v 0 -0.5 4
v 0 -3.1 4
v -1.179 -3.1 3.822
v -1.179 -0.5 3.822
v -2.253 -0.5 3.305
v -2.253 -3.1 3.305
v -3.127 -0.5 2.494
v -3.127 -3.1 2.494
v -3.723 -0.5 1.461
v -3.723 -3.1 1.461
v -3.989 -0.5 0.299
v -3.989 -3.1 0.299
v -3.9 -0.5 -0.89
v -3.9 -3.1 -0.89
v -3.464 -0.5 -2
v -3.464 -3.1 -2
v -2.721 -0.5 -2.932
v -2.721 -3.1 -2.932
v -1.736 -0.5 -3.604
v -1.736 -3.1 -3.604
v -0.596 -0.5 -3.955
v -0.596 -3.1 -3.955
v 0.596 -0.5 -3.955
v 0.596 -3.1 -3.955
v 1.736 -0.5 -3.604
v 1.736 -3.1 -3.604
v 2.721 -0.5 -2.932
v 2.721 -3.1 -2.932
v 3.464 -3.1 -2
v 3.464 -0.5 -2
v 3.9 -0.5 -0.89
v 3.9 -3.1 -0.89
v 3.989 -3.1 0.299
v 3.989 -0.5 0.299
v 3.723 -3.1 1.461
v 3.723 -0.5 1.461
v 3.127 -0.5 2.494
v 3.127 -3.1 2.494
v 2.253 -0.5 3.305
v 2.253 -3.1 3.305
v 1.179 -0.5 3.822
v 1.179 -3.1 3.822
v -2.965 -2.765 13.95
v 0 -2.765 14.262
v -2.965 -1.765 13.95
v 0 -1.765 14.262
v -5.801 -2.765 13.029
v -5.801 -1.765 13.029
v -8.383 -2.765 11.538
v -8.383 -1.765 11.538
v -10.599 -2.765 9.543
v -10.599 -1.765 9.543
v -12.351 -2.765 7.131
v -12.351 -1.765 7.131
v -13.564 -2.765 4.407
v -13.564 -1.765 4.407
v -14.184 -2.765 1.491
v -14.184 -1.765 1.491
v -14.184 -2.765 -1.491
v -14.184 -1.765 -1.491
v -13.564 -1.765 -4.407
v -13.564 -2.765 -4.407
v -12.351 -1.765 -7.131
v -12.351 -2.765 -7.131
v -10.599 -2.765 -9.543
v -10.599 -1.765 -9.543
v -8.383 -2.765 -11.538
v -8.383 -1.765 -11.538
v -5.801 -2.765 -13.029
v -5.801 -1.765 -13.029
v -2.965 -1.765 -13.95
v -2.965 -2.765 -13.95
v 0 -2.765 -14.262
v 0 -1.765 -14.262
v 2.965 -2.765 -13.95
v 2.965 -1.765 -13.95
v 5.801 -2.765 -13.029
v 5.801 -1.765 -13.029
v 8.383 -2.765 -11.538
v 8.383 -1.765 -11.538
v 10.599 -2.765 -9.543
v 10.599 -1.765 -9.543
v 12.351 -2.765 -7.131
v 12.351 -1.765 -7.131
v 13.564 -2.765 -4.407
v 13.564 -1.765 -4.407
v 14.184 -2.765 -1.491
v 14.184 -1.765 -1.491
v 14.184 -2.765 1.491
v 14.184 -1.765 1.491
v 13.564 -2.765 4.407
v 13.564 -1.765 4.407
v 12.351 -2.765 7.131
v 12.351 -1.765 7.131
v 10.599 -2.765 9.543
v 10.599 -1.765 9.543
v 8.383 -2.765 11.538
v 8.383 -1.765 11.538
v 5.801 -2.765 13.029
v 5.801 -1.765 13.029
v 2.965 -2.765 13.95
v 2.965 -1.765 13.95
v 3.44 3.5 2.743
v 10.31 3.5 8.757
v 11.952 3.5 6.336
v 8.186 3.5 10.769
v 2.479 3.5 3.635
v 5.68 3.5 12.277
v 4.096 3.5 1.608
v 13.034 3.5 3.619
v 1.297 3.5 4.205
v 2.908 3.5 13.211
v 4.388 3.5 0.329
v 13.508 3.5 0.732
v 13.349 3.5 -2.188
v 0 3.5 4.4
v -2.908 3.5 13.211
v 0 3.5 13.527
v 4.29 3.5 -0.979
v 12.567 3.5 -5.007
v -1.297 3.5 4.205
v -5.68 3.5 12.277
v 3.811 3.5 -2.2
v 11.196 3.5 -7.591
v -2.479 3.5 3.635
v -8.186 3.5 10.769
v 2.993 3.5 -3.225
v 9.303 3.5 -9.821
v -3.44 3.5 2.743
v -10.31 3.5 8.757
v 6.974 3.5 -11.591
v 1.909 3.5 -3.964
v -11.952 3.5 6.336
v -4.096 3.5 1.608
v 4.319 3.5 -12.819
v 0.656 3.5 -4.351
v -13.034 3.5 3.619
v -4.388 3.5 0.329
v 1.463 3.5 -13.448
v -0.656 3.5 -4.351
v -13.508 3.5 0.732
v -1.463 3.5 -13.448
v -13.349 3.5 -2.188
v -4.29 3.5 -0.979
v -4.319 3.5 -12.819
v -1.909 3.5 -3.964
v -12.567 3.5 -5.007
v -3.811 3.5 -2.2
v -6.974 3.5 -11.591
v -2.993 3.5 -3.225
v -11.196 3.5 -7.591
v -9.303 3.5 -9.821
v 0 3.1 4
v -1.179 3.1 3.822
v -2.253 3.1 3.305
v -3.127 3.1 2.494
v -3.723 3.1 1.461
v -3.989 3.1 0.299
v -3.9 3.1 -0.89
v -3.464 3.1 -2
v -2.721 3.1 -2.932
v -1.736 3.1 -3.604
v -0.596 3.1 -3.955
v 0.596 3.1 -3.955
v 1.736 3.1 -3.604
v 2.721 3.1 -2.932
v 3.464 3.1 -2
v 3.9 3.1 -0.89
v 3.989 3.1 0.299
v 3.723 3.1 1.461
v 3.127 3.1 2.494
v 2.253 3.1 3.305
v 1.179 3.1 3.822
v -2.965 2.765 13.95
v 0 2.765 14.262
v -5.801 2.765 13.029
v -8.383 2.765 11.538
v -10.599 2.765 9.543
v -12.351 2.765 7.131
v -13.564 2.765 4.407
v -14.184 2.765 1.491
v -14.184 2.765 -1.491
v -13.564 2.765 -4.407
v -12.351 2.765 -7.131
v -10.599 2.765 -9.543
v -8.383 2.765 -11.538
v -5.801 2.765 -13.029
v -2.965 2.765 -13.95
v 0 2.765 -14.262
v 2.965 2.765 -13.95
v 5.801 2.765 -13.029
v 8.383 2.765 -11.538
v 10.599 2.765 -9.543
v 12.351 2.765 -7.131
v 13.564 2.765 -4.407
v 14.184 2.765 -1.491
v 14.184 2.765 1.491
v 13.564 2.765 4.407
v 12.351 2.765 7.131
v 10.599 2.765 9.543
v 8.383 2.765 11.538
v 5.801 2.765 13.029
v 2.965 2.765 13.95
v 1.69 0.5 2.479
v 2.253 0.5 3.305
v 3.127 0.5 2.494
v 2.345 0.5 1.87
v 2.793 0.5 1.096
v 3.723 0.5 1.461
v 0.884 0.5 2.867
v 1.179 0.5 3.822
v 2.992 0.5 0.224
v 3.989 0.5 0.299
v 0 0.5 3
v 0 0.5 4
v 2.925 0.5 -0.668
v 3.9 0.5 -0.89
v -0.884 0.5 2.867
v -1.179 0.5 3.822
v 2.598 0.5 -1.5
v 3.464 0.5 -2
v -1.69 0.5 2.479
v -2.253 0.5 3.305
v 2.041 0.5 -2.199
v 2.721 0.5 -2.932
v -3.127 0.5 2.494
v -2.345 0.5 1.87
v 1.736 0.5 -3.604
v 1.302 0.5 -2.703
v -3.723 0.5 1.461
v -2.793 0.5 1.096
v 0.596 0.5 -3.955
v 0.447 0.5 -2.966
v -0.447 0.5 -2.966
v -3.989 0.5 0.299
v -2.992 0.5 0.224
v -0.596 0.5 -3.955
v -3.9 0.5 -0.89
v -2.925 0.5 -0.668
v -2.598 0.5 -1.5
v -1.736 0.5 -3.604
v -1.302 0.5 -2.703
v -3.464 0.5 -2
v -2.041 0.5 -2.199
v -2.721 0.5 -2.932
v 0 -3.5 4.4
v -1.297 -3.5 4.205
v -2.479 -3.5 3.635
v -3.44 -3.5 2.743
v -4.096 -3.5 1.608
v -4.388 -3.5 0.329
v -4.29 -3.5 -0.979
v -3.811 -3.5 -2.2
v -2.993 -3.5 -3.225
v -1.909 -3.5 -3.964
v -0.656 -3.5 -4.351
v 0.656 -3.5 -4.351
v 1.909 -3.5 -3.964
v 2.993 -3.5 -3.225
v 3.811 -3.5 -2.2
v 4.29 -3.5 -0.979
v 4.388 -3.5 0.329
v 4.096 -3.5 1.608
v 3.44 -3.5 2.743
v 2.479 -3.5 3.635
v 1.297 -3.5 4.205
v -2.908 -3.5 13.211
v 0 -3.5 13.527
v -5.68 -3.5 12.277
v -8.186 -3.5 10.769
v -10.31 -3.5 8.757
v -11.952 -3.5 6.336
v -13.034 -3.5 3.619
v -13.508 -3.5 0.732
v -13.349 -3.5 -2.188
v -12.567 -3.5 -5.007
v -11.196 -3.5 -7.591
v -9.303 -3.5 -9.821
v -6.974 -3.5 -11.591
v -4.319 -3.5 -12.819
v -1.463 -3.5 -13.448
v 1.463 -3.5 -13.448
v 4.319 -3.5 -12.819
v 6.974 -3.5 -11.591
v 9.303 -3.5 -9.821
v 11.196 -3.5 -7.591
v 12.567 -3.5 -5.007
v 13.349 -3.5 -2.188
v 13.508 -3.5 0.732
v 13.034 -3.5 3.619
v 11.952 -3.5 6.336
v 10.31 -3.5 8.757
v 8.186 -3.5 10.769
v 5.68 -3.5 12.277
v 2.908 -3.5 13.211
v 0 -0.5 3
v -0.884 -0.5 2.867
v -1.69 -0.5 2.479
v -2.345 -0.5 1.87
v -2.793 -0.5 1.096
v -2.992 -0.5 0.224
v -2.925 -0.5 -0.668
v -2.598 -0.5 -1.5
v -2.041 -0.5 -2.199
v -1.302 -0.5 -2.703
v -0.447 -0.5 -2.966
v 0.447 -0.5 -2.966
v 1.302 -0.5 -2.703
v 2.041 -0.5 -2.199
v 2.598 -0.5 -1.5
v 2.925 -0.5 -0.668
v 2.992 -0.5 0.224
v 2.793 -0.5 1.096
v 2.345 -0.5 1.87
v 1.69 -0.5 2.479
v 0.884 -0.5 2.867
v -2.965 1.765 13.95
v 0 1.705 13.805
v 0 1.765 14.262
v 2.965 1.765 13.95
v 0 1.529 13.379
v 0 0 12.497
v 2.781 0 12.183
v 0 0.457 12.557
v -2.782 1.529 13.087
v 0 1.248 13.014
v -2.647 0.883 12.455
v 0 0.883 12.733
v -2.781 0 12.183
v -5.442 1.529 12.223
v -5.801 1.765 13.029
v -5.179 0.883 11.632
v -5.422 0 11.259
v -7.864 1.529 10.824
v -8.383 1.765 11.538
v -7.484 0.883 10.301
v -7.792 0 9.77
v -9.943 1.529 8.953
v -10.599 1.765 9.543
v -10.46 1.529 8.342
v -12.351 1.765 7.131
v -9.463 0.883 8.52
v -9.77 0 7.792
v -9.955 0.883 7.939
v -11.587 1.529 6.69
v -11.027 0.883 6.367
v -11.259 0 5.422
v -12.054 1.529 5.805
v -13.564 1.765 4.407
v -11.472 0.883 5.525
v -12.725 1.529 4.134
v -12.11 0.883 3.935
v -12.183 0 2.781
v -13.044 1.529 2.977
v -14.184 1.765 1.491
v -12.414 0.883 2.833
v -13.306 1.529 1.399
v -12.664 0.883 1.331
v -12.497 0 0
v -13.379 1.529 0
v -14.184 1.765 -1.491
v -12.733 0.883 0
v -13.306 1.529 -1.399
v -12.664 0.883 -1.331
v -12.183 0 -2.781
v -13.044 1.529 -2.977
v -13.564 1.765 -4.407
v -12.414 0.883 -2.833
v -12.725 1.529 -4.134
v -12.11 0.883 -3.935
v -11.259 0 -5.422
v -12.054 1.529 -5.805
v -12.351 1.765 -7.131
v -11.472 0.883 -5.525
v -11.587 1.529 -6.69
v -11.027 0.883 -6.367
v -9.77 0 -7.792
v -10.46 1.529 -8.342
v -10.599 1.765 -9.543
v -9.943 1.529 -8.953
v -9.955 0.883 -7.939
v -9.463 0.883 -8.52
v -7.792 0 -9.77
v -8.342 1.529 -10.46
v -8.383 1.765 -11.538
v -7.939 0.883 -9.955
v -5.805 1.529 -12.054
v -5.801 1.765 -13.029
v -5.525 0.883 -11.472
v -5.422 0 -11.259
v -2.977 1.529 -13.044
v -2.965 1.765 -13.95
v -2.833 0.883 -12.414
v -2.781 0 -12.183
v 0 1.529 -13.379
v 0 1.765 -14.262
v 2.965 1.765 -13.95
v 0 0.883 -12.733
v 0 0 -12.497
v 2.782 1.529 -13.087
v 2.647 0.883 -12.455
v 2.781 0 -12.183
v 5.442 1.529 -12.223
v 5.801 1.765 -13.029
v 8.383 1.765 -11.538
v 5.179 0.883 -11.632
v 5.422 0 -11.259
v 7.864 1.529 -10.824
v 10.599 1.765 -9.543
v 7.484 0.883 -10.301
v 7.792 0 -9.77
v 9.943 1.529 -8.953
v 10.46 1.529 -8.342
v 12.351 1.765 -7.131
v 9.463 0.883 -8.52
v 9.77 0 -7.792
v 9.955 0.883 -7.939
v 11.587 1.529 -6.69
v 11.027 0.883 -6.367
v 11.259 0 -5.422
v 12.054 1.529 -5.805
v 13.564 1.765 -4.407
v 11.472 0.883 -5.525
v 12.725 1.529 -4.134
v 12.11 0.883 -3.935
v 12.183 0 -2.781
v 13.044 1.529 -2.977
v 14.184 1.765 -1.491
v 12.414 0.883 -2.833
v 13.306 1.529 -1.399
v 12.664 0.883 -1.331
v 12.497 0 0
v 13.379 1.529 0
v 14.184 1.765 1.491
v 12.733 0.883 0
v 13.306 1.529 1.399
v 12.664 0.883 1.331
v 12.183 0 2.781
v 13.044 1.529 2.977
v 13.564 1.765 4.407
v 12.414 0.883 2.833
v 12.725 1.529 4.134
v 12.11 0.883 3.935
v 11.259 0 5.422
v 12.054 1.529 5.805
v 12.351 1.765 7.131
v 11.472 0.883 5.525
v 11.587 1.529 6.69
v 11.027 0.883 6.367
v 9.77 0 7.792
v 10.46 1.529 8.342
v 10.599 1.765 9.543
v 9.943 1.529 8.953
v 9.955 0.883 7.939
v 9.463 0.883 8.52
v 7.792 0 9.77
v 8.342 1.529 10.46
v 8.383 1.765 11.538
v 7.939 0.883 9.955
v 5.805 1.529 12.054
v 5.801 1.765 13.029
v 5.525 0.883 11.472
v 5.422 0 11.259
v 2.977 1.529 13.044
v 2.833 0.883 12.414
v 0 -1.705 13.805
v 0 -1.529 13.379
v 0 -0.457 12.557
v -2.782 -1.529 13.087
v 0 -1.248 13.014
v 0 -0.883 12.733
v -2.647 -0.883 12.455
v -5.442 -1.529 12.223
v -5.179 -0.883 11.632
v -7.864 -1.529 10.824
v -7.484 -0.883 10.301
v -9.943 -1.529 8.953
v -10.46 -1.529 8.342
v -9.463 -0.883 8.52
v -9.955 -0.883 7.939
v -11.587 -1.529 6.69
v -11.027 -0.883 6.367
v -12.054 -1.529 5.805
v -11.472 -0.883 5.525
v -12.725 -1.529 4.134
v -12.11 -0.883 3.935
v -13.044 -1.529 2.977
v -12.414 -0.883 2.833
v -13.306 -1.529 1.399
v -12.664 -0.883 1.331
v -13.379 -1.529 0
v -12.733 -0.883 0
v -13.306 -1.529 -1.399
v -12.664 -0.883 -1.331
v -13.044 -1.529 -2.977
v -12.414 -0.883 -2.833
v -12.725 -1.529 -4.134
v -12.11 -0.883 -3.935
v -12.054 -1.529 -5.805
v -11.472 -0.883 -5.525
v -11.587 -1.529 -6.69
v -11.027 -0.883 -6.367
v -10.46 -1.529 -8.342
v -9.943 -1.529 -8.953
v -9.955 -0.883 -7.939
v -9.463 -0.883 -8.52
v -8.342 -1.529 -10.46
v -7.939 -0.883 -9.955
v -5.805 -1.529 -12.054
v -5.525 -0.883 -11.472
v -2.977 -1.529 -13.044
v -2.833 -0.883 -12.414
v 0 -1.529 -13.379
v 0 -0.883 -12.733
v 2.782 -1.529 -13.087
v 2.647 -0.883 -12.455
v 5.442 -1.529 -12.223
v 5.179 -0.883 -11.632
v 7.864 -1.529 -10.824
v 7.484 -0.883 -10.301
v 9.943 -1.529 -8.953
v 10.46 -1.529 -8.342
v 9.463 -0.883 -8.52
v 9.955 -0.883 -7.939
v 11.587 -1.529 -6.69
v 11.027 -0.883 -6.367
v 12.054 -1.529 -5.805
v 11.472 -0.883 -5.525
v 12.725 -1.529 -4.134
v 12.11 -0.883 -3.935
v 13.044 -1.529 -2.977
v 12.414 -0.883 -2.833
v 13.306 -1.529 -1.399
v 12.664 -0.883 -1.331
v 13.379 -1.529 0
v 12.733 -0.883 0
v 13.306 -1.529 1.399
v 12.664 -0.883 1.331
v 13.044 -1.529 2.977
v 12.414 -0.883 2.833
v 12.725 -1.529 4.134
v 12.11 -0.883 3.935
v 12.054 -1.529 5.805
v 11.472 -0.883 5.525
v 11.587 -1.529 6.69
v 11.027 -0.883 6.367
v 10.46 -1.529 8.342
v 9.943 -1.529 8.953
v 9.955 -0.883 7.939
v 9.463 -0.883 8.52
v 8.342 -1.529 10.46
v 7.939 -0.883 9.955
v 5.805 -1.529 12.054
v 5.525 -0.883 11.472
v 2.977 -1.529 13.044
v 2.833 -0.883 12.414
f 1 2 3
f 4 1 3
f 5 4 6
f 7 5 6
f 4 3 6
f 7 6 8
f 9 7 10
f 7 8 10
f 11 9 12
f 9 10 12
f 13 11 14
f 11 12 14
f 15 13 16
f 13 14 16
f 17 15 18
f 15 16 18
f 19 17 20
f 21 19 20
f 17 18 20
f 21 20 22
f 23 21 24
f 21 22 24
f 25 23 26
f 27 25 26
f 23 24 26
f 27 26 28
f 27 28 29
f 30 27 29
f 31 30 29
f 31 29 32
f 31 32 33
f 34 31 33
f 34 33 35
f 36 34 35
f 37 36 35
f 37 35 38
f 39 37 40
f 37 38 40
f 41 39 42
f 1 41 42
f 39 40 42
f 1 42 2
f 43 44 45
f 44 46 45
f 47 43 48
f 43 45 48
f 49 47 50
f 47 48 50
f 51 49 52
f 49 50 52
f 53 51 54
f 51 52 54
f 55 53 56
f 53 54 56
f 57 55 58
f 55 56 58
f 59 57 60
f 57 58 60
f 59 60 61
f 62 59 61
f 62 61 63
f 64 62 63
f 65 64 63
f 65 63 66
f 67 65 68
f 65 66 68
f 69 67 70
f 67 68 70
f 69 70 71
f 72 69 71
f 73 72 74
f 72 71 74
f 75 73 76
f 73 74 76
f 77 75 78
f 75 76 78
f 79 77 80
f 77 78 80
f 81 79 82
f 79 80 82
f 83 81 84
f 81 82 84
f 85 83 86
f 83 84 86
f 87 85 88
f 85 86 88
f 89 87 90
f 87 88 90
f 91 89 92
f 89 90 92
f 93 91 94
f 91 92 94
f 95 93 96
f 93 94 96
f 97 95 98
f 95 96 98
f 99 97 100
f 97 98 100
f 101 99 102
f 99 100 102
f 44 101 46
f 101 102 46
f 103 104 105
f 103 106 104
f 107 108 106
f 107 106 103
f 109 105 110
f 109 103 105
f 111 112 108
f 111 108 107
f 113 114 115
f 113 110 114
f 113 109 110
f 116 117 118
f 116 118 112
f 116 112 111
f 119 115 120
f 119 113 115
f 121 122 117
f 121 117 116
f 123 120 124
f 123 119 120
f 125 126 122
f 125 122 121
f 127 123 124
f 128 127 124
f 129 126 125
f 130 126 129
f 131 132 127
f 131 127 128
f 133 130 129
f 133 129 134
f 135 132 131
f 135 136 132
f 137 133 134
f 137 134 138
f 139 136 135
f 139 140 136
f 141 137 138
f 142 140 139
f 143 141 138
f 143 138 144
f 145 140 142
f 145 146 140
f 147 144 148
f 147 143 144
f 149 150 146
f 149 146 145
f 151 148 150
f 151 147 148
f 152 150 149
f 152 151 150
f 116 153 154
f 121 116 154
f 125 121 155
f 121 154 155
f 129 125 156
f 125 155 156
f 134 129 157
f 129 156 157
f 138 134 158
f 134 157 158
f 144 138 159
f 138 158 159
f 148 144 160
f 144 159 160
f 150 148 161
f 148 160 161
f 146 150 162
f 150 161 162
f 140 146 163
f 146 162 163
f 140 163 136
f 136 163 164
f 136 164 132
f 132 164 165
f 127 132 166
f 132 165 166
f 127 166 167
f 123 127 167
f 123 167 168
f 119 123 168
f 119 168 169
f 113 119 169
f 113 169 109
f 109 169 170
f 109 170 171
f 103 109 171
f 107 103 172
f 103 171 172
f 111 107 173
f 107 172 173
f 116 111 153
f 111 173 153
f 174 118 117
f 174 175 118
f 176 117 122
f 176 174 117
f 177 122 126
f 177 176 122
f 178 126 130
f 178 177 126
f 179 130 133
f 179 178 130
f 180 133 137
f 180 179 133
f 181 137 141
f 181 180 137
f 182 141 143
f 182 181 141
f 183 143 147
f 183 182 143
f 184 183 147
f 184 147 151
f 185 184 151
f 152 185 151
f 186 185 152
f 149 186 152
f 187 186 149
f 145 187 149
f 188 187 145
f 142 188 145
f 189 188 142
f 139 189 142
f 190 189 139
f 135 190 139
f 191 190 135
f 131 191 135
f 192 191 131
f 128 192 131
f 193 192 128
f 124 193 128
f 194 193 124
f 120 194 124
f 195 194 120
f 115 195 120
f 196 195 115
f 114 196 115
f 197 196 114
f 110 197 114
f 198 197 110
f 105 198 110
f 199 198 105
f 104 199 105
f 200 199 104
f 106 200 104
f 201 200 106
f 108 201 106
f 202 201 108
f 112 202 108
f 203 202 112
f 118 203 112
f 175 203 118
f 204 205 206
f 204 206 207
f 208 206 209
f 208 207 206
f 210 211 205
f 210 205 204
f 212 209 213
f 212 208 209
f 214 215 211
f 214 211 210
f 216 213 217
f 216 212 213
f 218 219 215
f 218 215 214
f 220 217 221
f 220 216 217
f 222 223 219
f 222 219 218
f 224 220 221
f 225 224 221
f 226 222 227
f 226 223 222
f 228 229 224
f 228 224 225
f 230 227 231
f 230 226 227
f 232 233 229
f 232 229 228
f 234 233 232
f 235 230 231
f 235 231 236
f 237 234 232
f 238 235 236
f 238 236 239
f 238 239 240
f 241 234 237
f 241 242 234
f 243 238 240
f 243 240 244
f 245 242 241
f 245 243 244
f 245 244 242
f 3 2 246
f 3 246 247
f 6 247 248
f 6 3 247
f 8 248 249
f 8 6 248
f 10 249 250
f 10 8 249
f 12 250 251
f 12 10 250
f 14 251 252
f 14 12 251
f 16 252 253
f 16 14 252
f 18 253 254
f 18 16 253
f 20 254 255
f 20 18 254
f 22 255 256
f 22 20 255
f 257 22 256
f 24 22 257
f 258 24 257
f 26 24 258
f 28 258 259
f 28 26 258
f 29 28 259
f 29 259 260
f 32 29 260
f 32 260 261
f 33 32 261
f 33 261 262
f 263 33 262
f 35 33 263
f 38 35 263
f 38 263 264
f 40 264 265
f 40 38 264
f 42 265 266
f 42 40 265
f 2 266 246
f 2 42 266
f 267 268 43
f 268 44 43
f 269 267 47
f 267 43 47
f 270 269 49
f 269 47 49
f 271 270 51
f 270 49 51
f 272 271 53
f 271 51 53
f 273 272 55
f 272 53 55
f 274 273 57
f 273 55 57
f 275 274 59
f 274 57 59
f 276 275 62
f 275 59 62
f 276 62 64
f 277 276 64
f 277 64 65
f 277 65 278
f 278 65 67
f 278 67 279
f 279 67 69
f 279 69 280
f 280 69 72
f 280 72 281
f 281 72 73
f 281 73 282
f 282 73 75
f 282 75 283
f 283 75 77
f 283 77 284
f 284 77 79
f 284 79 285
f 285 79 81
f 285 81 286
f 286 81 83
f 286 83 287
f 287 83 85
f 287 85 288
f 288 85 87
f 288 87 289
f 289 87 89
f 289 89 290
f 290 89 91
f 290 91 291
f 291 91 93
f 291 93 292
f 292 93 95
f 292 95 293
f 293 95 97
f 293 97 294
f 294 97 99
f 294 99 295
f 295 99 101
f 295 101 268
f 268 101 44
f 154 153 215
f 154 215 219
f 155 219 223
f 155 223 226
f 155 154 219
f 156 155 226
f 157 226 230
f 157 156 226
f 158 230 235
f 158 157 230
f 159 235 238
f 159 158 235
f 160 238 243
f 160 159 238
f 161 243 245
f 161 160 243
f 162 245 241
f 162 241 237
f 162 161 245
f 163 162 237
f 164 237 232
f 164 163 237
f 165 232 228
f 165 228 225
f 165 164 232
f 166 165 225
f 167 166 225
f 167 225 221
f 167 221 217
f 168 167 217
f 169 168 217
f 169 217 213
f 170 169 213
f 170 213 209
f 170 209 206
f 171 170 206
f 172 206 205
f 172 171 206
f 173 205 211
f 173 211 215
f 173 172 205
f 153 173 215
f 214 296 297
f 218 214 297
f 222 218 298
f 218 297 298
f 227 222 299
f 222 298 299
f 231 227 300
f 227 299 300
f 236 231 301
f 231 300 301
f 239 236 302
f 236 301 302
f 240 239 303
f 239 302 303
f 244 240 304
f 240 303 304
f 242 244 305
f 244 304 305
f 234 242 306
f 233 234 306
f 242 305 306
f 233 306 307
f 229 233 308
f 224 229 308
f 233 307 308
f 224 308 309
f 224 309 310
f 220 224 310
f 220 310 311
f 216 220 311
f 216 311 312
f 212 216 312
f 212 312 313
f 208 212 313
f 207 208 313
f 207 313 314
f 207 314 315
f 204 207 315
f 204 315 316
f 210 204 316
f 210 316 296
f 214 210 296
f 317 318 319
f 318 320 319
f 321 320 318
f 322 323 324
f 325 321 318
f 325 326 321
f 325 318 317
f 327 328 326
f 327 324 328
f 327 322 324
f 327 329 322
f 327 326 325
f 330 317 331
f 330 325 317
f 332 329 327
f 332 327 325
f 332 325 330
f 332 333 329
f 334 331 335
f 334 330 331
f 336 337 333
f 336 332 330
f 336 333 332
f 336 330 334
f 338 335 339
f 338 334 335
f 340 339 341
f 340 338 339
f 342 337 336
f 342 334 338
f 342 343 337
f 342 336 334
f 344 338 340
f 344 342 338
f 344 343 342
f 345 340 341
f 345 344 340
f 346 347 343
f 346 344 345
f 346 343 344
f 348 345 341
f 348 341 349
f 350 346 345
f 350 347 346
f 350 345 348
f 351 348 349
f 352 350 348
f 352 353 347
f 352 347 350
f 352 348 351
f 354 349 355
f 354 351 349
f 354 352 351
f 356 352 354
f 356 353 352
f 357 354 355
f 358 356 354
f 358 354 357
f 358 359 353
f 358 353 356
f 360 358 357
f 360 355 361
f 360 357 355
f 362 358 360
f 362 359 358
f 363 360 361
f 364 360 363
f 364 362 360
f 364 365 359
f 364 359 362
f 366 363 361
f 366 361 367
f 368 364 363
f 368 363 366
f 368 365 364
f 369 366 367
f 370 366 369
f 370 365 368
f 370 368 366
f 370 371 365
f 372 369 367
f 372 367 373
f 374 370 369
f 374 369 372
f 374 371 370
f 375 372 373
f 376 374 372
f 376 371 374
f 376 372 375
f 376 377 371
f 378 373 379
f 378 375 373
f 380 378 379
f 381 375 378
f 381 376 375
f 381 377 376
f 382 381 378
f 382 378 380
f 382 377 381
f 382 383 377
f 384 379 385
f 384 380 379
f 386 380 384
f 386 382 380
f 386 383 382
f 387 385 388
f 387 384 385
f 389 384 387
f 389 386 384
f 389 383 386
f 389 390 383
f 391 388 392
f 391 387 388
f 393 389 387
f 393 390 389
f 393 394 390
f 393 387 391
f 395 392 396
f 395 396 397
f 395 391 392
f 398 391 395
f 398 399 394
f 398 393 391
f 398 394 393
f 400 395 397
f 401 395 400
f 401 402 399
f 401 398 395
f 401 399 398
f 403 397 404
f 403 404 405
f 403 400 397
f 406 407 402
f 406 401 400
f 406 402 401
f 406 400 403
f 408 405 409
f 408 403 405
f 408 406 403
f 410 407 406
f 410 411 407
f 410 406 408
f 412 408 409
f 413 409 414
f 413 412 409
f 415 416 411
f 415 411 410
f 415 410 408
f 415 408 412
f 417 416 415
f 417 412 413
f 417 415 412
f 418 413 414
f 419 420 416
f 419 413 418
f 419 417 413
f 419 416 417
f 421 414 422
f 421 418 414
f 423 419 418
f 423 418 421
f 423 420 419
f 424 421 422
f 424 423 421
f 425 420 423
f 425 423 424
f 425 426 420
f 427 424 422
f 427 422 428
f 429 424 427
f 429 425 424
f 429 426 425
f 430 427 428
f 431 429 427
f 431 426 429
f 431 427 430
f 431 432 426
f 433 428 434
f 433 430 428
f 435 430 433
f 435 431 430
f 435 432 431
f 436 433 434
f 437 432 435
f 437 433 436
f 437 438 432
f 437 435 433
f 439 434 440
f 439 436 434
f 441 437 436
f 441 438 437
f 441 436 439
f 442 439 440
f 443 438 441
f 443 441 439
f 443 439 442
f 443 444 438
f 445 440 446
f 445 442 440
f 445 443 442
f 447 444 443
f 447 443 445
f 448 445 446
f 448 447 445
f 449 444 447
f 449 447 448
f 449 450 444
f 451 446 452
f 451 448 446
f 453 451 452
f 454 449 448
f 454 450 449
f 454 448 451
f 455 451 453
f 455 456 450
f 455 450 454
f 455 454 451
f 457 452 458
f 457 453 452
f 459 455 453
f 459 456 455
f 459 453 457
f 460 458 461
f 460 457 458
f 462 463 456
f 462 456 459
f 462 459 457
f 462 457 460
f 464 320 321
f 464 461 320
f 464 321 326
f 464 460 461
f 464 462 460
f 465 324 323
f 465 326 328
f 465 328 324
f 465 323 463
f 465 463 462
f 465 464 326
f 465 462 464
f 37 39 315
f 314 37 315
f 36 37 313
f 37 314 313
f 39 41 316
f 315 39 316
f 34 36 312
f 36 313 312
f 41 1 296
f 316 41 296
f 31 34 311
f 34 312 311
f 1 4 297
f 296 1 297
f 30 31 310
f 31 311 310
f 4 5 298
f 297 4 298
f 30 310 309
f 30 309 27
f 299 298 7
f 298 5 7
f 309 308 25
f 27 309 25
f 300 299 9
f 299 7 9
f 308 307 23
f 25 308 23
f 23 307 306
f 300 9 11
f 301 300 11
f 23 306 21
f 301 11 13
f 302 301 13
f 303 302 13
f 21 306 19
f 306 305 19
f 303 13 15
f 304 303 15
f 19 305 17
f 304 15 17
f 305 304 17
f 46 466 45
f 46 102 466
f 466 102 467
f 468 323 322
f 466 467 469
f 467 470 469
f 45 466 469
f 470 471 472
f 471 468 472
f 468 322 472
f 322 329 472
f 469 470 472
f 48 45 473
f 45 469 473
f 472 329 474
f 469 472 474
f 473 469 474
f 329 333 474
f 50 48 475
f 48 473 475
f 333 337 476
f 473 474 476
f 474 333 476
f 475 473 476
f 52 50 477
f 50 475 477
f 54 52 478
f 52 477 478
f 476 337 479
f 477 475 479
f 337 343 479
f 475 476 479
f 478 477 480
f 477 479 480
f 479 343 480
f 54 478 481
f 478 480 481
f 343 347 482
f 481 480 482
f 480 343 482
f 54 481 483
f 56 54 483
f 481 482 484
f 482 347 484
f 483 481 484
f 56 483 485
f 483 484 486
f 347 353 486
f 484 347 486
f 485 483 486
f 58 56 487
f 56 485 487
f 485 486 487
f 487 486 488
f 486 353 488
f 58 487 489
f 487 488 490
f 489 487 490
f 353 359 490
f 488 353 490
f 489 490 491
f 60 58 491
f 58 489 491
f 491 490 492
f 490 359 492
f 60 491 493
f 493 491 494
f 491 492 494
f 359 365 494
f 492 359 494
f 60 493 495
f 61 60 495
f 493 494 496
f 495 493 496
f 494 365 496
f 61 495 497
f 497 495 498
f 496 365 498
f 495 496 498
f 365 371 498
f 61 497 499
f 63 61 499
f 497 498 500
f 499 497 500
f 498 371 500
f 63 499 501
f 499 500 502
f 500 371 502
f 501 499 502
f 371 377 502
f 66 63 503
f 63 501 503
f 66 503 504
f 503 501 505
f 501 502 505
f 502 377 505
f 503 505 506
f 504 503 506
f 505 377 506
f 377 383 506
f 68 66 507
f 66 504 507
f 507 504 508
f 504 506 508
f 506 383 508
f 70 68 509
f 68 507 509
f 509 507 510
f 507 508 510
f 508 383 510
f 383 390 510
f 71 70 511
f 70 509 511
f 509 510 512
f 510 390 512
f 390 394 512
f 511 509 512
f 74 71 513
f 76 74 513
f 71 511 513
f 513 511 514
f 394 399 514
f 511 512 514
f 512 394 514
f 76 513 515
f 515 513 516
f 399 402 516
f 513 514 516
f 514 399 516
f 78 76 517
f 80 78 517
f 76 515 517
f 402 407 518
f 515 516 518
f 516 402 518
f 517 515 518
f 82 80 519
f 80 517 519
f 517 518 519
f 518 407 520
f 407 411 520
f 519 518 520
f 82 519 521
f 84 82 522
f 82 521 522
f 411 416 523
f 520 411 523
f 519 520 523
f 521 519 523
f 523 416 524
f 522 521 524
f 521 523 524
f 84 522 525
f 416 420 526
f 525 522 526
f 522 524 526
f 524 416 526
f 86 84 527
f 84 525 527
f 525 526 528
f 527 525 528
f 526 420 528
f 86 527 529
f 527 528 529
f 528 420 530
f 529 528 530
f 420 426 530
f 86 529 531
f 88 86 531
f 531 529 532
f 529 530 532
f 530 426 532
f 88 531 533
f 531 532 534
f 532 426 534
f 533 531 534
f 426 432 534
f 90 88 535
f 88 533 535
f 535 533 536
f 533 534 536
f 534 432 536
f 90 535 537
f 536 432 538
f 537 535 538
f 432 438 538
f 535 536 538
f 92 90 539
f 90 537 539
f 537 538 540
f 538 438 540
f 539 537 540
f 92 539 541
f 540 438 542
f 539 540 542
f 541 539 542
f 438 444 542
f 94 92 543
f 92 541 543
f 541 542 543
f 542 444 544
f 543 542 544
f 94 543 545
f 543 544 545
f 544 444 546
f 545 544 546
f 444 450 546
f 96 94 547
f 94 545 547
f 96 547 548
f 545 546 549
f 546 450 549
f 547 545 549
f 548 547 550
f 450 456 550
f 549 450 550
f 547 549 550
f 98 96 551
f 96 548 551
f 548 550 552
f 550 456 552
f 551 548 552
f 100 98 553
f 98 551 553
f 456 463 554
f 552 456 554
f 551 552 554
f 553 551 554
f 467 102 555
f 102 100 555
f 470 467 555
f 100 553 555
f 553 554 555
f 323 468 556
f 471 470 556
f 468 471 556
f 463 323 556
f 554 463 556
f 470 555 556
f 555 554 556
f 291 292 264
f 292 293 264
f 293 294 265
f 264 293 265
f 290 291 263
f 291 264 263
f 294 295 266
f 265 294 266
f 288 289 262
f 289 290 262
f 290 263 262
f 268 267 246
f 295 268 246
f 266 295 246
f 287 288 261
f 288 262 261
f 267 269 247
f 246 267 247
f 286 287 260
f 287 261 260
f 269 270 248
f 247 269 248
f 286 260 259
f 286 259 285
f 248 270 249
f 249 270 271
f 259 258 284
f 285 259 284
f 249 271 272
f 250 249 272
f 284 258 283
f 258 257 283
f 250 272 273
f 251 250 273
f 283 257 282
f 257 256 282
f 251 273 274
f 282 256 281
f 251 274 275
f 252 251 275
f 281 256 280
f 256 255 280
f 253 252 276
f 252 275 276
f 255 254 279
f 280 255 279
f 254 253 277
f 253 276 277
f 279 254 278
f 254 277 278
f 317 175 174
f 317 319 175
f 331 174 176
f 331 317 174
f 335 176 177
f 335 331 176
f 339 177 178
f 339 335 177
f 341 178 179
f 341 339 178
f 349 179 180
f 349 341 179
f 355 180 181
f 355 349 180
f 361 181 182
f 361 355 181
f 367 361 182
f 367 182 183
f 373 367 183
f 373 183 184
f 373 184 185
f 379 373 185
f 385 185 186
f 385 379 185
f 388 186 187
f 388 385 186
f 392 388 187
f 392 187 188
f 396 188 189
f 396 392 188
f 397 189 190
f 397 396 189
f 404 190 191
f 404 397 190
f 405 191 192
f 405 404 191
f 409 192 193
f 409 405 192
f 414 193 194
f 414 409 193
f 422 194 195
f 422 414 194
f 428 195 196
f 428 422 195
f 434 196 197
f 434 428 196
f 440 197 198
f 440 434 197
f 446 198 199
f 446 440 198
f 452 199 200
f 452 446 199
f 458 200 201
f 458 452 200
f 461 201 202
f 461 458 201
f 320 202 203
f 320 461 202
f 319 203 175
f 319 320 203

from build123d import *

# Parameters (mm, degrees)
CHAMFER1_SIZE = 0.4


with BuildPart() as part:
    # Sketch1 → Revolve1 (revolve)
    with BuildSketch(Plane(origin=(0, 0, 0), x_dir=(0, 0, -1), z_dir=(1, 0, 0))):
        with BuildLine():
            Line((-4, 3.5), (-13.5274, 3.5))
            Line((-13.5274, 3.5), (-14.2621, 2.7653))
            Line((-14.2621, 2.7653), (-14.2621, 1.7653))
            ThreePointArc((-14.2621, 1.7653), (-13.013844399, 1.248255601), (-12.4968, 0))
            Line((-12.4968, 0), (-3, 0))
            Line((-3, 0), (-3, 0.5))
            Line((-3, 0.5), (-4, 0.5))
            Line((-4, 0.5), (-4, 3.5))
        make_face()
    revolve1 = revolve(axis=Axis((0, 19.017402143, 0), (0, -1, 0)))

    # Mirror1: Revolve1 across plane
    add(revolve1.mirror(Plane.ZX))

    # Chamfer1
    chamfer1_edges = [part.edges().sort_by_distance(p)[0] for p in [
        (0, 3.5, -4),
        (0, -3.5, -4),
    ]]
    chamfer(chamfer1_edges, length=CHAMFER1_SIZE)


solid = part.part
